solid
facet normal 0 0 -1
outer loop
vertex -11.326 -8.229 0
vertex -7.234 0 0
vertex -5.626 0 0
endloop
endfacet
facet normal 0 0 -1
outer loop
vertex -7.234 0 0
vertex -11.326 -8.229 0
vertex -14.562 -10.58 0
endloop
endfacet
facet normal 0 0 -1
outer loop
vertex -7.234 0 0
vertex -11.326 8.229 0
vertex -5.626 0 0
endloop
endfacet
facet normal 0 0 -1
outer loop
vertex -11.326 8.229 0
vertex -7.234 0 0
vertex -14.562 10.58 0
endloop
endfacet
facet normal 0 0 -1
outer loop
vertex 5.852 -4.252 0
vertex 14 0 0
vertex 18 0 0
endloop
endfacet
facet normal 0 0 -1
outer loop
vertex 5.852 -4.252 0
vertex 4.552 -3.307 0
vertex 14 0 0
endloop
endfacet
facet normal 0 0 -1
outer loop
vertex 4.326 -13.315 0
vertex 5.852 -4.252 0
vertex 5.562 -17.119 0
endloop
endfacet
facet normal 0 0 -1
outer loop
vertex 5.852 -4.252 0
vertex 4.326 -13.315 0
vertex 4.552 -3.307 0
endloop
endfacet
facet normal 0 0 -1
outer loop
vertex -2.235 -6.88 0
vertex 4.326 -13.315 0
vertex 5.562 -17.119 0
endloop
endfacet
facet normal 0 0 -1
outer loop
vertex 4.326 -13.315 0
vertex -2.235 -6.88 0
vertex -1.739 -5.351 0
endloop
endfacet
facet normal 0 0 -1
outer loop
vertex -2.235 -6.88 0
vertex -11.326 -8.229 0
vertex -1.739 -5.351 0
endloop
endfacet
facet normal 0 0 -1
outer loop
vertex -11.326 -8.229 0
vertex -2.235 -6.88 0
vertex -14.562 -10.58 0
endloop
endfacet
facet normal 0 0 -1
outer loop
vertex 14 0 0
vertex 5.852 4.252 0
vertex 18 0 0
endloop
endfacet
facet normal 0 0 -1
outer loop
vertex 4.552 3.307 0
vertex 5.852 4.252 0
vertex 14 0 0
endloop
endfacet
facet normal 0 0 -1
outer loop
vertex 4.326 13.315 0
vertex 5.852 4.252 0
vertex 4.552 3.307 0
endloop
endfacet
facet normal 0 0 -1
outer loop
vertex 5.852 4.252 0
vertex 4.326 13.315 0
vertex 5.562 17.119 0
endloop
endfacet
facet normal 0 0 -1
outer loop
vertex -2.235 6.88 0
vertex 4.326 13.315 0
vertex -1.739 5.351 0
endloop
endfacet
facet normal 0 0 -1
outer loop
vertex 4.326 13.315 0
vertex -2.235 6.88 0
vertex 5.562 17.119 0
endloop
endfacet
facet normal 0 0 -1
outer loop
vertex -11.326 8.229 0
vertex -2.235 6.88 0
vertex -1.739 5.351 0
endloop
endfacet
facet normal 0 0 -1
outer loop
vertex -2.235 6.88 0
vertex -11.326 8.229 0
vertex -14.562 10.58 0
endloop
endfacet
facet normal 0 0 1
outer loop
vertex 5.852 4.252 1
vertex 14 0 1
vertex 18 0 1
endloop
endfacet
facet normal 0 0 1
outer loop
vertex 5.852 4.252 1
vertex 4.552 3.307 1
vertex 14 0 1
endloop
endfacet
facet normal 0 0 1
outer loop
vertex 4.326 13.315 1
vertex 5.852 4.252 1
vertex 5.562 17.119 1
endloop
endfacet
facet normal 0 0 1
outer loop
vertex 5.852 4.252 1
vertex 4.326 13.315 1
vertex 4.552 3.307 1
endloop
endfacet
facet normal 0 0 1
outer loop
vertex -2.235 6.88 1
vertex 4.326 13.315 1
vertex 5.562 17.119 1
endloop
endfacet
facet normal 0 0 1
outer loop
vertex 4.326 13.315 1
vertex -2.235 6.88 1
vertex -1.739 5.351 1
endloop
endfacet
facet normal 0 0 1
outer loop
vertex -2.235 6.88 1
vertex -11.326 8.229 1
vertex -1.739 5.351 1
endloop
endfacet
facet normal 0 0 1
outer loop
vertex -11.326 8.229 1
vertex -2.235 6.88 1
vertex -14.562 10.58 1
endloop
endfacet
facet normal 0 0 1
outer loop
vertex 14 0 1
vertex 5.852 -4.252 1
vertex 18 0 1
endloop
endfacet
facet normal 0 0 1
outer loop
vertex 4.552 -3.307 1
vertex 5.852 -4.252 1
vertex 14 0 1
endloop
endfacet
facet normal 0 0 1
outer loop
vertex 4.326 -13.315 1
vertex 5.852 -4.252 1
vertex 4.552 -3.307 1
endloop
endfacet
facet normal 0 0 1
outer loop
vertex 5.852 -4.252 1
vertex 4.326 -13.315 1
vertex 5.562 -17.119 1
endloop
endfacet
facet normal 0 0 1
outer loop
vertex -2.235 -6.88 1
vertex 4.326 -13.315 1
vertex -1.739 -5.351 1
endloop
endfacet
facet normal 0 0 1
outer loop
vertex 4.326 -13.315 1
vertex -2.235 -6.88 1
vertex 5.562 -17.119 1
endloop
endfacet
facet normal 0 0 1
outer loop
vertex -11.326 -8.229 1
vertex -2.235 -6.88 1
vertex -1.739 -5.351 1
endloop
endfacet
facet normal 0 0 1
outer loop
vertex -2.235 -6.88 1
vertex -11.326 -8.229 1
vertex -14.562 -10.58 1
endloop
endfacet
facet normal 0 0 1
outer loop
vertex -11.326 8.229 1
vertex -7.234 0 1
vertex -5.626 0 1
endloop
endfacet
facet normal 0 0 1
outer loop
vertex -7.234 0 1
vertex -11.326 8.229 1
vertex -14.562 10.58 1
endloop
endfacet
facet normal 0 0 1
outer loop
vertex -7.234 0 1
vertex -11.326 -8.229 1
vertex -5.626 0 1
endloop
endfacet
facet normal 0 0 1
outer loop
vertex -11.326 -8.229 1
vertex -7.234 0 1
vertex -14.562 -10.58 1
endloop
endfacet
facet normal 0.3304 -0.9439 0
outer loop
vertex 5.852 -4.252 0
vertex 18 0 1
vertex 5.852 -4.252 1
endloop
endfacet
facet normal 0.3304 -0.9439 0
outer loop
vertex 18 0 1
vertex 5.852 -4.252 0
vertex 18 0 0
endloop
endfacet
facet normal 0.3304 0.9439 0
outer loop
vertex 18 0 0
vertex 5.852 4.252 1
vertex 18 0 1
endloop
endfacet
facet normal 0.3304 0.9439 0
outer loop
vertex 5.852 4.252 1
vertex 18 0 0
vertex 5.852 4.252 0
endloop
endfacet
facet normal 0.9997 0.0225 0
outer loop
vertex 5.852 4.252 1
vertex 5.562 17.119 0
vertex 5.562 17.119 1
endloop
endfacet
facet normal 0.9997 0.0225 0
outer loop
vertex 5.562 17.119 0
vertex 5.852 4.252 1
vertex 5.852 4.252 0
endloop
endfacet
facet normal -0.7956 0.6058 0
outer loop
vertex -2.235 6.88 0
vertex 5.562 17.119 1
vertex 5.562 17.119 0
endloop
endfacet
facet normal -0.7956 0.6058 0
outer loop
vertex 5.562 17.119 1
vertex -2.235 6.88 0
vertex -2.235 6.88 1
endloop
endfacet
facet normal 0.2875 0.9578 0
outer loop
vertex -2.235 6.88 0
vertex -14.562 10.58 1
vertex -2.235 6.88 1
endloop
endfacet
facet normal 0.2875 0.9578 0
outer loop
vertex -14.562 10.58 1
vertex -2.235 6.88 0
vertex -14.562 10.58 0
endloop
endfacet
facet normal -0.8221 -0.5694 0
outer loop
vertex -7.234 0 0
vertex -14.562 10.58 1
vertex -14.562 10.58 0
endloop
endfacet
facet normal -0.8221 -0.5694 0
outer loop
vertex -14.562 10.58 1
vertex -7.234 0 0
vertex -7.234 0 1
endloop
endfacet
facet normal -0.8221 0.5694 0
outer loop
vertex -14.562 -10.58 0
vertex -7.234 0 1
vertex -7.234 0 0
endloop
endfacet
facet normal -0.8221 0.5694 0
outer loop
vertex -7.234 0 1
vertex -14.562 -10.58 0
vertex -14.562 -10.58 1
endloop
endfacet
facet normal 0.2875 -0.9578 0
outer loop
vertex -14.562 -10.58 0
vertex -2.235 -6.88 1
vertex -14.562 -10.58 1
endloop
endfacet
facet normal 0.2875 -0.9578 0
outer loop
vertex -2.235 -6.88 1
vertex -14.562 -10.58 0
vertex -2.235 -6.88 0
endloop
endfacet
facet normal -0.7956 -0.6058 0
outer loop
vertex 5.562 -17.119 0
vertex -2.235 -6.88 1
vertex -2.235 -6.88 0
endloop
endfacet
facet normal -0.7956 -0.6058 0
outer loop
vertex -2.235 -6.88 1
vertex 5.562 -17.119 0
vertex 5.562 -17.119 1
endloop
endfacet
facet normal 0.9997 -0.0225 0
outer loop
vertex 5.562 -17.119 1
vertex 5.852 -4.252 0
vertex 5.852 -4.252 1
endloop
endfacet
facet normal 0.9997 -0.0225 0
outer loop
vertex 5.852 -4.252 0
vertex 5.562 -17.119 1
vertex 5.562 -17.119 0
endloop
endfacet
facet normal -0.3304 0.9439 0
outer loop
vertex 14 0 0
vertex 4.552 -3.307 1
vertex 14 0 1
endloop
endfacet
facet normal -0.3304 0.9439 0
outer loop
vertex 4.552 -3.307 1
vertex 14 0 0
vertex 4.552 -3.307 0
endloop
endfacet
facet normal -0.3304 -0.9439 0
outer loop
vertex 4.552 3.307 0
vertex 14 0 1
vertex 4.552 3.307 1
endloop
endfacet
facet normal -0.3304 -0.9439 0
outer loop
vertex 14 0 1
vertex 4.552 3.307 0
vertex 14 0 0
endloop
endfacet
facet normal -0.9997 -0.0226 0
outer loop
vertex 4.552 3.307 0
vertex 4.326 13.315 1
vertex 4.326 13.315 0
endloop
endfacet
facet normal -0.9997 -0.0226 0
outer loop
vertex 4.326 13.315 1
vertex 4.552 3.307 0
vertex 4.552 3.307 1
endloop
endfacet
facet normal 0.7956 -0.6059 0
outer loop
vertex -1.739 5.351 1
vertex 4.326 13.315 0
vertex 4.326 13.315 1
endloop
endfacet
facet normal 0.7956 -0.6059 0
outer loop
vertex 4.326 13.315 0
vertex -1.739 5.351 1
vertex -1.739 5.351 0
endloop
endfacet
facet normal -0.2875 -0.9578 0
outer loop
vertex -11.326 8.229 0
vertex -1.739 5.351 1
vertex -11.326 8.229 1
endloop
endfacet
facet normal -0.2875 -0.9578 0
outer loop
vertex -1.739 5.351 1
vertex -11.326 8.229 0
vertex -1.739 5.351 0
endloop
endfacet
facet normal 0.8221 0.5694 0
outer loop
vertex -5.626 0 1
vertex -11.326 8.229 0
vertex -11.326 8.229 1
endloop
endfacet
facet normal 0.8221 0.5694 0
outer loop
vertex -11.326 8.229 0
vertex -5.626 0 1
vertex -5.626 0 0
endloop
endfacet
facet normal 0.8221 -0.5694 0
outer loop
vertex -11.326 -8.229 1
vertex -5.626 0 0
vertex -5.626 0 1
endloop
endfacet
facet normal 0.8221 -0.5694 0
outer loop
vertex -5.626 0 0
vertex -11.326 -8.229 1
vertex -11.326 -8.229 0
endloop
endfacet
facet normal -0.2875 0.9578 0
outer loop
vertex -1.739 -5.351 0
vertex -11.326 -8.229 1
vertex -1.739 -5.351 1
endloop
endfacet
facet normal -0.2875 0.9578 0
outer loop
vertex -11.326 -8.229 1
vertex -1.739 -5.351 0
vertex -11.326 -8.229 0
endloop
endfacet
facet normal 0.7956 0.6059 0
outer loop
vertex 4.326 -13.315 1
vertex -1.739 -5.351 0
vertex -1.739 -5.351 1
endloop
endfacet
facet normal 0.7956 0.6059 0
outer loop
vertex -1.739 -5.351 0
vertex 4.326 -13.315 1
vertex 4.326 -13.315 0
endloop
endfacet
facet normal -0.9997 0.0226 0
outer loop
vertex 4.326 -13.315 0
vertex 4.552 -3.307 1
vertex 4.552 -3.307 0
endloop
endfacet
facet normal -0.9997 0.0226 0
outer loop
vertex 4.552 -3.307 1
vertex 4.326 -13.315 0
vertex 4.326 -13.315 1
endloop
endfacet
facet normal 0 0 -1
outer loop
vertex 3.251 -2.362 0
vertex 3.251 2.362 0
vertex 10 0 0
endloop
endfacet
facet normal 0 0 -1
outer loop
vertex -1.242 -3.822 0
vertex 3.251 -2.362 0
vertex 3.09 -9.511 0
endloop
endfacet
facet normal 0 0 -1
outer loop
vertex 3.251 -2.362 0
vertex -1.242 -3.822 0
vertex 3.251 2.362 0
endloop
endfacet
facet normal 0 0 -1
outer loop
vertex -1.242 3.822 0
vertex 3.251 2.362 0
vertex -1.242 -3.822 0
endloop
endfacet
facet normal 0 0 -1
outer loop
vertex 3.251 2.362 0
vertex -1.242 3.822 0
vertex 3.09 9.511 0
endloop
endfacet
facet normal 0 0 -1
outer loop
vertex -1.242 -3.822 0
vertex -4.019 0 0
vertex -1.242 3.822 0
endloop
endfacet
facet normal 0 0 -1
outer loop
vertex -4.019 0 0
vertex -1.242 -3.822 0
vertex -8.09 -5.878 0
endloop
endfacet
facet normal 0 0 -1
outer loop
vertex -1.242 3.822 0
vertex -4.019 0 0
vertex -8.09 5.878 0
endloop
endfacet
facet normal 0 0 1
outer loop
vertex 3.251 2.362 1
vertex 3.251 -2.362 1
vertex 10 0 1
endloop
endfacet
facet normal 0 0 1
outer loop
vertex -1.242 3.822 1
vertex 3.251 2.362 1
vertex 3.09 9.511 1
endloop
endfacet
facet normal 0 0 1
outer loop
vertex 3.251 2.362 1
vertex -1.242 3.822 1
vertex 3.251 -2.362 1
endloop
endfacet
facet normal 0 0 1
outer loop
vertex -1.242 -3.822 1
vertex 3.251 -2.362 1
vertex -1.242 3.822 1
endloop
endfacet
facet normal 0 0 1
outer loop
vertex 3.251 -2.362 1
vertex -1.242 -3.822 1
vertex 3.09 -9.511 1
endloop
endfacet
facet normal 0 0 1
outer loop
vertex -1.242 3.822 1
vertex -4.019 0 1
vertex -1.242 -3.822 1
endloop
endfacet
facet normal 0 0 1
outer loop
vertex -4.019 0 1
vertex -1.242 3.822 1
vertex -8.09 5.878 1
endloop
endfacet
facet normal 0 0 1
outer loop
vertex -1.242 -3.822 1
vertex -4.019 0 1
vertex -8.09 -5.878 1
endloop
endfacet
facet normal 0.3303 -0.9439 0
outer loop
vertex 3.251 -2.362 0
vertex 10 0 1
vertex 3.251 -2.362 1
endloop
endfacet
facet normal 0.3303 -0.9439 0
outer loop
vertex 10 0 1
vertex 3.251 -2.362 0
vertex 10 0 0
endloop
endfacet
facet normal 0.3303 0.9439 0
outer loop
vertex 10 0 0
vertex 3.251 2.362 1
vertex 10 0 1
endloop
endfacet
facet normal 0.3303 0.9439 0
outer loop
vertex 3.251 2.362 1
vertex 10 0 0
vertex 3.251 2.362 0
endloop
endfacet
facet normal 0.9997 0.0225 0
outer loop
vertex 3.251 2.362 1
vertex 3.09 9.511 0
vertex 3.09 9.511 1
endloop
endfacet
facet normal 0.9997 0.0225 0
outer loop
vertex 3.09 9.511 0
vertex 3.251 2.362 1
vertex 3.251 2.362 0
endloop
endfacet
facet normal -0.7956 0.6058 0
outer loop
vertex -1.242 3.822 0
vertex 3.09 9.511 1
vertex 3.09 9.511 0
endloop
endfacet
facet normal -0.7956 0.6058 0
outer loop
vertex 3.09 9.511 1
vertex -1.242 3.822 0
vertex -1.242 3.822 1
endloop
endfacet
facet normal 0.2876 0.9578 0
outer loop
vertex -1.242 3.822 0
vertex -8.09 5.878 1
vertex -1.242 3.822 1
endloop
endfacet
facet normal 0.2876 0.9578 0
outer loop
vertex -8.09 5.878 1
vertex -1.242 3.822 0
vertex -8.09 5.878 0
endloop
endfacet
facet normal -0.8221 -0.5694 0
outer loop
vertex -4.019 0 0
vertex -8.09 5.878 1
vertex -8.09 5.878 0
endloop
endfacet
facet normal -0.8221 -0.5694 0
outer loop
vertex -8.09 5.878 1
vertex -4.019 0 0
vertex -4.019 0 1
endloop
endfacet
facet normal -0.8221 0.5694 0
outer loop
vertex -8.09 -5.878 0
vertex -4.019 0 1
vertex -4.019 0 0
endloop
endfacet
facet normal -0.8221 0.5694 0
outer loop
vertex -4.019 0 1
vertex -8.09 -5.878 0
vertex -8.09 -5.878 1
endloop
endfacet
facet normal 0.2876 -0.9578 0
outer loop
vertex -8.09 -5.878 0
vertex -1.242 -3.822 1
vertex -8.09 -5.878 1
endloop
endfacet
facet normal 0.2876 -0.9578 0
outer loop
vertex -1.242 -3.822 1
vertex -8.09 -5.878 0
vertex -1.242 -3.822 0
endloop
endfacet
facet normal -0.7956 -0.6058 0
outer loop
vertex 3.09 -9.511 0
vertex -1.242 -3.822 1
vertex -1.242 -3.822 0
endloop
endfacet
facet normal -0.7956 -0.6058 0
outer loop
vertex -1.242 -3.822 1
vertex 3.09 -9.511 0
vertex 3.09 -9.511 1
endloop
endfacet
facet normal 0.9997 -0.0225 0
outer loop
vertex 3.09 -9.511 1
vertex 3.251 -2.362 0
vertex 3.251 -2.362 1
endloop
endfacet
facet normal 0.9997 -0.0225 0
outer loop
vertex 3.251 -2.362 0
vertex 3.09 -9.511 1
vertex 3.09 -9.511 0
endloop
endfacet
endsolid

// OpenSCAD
difference(){
  star(18,fat_ratio=.35);
  translate([0,0,-.01]) star(14,extrude=1.02,fat_ratio=.35);
}
star(fat_ratio=.35);
/*
difference(){
  translate([0,0,-1]) cylinder(d=40,h=2);
  star(18,extrude=1.02,fat_ratio=.35);
}
difference(){
  star(14,fat_ratio=.35);
  translate([0,0,-.01]) star(extrude=1.02,fat_ratio=.35);
}
*/
//  star(fat_ratio=.35);
module star(size=10,points=5,extrude=1,fat_ratio=.25)
{
  linear_extrude(extrude)
  for(dir=[1:points])
    rotate([0,0,(360/points) * dir])
      polygon([[0,size*fat_ratio],[size,0],[0,size*fat_ratio*-1]]);
}
